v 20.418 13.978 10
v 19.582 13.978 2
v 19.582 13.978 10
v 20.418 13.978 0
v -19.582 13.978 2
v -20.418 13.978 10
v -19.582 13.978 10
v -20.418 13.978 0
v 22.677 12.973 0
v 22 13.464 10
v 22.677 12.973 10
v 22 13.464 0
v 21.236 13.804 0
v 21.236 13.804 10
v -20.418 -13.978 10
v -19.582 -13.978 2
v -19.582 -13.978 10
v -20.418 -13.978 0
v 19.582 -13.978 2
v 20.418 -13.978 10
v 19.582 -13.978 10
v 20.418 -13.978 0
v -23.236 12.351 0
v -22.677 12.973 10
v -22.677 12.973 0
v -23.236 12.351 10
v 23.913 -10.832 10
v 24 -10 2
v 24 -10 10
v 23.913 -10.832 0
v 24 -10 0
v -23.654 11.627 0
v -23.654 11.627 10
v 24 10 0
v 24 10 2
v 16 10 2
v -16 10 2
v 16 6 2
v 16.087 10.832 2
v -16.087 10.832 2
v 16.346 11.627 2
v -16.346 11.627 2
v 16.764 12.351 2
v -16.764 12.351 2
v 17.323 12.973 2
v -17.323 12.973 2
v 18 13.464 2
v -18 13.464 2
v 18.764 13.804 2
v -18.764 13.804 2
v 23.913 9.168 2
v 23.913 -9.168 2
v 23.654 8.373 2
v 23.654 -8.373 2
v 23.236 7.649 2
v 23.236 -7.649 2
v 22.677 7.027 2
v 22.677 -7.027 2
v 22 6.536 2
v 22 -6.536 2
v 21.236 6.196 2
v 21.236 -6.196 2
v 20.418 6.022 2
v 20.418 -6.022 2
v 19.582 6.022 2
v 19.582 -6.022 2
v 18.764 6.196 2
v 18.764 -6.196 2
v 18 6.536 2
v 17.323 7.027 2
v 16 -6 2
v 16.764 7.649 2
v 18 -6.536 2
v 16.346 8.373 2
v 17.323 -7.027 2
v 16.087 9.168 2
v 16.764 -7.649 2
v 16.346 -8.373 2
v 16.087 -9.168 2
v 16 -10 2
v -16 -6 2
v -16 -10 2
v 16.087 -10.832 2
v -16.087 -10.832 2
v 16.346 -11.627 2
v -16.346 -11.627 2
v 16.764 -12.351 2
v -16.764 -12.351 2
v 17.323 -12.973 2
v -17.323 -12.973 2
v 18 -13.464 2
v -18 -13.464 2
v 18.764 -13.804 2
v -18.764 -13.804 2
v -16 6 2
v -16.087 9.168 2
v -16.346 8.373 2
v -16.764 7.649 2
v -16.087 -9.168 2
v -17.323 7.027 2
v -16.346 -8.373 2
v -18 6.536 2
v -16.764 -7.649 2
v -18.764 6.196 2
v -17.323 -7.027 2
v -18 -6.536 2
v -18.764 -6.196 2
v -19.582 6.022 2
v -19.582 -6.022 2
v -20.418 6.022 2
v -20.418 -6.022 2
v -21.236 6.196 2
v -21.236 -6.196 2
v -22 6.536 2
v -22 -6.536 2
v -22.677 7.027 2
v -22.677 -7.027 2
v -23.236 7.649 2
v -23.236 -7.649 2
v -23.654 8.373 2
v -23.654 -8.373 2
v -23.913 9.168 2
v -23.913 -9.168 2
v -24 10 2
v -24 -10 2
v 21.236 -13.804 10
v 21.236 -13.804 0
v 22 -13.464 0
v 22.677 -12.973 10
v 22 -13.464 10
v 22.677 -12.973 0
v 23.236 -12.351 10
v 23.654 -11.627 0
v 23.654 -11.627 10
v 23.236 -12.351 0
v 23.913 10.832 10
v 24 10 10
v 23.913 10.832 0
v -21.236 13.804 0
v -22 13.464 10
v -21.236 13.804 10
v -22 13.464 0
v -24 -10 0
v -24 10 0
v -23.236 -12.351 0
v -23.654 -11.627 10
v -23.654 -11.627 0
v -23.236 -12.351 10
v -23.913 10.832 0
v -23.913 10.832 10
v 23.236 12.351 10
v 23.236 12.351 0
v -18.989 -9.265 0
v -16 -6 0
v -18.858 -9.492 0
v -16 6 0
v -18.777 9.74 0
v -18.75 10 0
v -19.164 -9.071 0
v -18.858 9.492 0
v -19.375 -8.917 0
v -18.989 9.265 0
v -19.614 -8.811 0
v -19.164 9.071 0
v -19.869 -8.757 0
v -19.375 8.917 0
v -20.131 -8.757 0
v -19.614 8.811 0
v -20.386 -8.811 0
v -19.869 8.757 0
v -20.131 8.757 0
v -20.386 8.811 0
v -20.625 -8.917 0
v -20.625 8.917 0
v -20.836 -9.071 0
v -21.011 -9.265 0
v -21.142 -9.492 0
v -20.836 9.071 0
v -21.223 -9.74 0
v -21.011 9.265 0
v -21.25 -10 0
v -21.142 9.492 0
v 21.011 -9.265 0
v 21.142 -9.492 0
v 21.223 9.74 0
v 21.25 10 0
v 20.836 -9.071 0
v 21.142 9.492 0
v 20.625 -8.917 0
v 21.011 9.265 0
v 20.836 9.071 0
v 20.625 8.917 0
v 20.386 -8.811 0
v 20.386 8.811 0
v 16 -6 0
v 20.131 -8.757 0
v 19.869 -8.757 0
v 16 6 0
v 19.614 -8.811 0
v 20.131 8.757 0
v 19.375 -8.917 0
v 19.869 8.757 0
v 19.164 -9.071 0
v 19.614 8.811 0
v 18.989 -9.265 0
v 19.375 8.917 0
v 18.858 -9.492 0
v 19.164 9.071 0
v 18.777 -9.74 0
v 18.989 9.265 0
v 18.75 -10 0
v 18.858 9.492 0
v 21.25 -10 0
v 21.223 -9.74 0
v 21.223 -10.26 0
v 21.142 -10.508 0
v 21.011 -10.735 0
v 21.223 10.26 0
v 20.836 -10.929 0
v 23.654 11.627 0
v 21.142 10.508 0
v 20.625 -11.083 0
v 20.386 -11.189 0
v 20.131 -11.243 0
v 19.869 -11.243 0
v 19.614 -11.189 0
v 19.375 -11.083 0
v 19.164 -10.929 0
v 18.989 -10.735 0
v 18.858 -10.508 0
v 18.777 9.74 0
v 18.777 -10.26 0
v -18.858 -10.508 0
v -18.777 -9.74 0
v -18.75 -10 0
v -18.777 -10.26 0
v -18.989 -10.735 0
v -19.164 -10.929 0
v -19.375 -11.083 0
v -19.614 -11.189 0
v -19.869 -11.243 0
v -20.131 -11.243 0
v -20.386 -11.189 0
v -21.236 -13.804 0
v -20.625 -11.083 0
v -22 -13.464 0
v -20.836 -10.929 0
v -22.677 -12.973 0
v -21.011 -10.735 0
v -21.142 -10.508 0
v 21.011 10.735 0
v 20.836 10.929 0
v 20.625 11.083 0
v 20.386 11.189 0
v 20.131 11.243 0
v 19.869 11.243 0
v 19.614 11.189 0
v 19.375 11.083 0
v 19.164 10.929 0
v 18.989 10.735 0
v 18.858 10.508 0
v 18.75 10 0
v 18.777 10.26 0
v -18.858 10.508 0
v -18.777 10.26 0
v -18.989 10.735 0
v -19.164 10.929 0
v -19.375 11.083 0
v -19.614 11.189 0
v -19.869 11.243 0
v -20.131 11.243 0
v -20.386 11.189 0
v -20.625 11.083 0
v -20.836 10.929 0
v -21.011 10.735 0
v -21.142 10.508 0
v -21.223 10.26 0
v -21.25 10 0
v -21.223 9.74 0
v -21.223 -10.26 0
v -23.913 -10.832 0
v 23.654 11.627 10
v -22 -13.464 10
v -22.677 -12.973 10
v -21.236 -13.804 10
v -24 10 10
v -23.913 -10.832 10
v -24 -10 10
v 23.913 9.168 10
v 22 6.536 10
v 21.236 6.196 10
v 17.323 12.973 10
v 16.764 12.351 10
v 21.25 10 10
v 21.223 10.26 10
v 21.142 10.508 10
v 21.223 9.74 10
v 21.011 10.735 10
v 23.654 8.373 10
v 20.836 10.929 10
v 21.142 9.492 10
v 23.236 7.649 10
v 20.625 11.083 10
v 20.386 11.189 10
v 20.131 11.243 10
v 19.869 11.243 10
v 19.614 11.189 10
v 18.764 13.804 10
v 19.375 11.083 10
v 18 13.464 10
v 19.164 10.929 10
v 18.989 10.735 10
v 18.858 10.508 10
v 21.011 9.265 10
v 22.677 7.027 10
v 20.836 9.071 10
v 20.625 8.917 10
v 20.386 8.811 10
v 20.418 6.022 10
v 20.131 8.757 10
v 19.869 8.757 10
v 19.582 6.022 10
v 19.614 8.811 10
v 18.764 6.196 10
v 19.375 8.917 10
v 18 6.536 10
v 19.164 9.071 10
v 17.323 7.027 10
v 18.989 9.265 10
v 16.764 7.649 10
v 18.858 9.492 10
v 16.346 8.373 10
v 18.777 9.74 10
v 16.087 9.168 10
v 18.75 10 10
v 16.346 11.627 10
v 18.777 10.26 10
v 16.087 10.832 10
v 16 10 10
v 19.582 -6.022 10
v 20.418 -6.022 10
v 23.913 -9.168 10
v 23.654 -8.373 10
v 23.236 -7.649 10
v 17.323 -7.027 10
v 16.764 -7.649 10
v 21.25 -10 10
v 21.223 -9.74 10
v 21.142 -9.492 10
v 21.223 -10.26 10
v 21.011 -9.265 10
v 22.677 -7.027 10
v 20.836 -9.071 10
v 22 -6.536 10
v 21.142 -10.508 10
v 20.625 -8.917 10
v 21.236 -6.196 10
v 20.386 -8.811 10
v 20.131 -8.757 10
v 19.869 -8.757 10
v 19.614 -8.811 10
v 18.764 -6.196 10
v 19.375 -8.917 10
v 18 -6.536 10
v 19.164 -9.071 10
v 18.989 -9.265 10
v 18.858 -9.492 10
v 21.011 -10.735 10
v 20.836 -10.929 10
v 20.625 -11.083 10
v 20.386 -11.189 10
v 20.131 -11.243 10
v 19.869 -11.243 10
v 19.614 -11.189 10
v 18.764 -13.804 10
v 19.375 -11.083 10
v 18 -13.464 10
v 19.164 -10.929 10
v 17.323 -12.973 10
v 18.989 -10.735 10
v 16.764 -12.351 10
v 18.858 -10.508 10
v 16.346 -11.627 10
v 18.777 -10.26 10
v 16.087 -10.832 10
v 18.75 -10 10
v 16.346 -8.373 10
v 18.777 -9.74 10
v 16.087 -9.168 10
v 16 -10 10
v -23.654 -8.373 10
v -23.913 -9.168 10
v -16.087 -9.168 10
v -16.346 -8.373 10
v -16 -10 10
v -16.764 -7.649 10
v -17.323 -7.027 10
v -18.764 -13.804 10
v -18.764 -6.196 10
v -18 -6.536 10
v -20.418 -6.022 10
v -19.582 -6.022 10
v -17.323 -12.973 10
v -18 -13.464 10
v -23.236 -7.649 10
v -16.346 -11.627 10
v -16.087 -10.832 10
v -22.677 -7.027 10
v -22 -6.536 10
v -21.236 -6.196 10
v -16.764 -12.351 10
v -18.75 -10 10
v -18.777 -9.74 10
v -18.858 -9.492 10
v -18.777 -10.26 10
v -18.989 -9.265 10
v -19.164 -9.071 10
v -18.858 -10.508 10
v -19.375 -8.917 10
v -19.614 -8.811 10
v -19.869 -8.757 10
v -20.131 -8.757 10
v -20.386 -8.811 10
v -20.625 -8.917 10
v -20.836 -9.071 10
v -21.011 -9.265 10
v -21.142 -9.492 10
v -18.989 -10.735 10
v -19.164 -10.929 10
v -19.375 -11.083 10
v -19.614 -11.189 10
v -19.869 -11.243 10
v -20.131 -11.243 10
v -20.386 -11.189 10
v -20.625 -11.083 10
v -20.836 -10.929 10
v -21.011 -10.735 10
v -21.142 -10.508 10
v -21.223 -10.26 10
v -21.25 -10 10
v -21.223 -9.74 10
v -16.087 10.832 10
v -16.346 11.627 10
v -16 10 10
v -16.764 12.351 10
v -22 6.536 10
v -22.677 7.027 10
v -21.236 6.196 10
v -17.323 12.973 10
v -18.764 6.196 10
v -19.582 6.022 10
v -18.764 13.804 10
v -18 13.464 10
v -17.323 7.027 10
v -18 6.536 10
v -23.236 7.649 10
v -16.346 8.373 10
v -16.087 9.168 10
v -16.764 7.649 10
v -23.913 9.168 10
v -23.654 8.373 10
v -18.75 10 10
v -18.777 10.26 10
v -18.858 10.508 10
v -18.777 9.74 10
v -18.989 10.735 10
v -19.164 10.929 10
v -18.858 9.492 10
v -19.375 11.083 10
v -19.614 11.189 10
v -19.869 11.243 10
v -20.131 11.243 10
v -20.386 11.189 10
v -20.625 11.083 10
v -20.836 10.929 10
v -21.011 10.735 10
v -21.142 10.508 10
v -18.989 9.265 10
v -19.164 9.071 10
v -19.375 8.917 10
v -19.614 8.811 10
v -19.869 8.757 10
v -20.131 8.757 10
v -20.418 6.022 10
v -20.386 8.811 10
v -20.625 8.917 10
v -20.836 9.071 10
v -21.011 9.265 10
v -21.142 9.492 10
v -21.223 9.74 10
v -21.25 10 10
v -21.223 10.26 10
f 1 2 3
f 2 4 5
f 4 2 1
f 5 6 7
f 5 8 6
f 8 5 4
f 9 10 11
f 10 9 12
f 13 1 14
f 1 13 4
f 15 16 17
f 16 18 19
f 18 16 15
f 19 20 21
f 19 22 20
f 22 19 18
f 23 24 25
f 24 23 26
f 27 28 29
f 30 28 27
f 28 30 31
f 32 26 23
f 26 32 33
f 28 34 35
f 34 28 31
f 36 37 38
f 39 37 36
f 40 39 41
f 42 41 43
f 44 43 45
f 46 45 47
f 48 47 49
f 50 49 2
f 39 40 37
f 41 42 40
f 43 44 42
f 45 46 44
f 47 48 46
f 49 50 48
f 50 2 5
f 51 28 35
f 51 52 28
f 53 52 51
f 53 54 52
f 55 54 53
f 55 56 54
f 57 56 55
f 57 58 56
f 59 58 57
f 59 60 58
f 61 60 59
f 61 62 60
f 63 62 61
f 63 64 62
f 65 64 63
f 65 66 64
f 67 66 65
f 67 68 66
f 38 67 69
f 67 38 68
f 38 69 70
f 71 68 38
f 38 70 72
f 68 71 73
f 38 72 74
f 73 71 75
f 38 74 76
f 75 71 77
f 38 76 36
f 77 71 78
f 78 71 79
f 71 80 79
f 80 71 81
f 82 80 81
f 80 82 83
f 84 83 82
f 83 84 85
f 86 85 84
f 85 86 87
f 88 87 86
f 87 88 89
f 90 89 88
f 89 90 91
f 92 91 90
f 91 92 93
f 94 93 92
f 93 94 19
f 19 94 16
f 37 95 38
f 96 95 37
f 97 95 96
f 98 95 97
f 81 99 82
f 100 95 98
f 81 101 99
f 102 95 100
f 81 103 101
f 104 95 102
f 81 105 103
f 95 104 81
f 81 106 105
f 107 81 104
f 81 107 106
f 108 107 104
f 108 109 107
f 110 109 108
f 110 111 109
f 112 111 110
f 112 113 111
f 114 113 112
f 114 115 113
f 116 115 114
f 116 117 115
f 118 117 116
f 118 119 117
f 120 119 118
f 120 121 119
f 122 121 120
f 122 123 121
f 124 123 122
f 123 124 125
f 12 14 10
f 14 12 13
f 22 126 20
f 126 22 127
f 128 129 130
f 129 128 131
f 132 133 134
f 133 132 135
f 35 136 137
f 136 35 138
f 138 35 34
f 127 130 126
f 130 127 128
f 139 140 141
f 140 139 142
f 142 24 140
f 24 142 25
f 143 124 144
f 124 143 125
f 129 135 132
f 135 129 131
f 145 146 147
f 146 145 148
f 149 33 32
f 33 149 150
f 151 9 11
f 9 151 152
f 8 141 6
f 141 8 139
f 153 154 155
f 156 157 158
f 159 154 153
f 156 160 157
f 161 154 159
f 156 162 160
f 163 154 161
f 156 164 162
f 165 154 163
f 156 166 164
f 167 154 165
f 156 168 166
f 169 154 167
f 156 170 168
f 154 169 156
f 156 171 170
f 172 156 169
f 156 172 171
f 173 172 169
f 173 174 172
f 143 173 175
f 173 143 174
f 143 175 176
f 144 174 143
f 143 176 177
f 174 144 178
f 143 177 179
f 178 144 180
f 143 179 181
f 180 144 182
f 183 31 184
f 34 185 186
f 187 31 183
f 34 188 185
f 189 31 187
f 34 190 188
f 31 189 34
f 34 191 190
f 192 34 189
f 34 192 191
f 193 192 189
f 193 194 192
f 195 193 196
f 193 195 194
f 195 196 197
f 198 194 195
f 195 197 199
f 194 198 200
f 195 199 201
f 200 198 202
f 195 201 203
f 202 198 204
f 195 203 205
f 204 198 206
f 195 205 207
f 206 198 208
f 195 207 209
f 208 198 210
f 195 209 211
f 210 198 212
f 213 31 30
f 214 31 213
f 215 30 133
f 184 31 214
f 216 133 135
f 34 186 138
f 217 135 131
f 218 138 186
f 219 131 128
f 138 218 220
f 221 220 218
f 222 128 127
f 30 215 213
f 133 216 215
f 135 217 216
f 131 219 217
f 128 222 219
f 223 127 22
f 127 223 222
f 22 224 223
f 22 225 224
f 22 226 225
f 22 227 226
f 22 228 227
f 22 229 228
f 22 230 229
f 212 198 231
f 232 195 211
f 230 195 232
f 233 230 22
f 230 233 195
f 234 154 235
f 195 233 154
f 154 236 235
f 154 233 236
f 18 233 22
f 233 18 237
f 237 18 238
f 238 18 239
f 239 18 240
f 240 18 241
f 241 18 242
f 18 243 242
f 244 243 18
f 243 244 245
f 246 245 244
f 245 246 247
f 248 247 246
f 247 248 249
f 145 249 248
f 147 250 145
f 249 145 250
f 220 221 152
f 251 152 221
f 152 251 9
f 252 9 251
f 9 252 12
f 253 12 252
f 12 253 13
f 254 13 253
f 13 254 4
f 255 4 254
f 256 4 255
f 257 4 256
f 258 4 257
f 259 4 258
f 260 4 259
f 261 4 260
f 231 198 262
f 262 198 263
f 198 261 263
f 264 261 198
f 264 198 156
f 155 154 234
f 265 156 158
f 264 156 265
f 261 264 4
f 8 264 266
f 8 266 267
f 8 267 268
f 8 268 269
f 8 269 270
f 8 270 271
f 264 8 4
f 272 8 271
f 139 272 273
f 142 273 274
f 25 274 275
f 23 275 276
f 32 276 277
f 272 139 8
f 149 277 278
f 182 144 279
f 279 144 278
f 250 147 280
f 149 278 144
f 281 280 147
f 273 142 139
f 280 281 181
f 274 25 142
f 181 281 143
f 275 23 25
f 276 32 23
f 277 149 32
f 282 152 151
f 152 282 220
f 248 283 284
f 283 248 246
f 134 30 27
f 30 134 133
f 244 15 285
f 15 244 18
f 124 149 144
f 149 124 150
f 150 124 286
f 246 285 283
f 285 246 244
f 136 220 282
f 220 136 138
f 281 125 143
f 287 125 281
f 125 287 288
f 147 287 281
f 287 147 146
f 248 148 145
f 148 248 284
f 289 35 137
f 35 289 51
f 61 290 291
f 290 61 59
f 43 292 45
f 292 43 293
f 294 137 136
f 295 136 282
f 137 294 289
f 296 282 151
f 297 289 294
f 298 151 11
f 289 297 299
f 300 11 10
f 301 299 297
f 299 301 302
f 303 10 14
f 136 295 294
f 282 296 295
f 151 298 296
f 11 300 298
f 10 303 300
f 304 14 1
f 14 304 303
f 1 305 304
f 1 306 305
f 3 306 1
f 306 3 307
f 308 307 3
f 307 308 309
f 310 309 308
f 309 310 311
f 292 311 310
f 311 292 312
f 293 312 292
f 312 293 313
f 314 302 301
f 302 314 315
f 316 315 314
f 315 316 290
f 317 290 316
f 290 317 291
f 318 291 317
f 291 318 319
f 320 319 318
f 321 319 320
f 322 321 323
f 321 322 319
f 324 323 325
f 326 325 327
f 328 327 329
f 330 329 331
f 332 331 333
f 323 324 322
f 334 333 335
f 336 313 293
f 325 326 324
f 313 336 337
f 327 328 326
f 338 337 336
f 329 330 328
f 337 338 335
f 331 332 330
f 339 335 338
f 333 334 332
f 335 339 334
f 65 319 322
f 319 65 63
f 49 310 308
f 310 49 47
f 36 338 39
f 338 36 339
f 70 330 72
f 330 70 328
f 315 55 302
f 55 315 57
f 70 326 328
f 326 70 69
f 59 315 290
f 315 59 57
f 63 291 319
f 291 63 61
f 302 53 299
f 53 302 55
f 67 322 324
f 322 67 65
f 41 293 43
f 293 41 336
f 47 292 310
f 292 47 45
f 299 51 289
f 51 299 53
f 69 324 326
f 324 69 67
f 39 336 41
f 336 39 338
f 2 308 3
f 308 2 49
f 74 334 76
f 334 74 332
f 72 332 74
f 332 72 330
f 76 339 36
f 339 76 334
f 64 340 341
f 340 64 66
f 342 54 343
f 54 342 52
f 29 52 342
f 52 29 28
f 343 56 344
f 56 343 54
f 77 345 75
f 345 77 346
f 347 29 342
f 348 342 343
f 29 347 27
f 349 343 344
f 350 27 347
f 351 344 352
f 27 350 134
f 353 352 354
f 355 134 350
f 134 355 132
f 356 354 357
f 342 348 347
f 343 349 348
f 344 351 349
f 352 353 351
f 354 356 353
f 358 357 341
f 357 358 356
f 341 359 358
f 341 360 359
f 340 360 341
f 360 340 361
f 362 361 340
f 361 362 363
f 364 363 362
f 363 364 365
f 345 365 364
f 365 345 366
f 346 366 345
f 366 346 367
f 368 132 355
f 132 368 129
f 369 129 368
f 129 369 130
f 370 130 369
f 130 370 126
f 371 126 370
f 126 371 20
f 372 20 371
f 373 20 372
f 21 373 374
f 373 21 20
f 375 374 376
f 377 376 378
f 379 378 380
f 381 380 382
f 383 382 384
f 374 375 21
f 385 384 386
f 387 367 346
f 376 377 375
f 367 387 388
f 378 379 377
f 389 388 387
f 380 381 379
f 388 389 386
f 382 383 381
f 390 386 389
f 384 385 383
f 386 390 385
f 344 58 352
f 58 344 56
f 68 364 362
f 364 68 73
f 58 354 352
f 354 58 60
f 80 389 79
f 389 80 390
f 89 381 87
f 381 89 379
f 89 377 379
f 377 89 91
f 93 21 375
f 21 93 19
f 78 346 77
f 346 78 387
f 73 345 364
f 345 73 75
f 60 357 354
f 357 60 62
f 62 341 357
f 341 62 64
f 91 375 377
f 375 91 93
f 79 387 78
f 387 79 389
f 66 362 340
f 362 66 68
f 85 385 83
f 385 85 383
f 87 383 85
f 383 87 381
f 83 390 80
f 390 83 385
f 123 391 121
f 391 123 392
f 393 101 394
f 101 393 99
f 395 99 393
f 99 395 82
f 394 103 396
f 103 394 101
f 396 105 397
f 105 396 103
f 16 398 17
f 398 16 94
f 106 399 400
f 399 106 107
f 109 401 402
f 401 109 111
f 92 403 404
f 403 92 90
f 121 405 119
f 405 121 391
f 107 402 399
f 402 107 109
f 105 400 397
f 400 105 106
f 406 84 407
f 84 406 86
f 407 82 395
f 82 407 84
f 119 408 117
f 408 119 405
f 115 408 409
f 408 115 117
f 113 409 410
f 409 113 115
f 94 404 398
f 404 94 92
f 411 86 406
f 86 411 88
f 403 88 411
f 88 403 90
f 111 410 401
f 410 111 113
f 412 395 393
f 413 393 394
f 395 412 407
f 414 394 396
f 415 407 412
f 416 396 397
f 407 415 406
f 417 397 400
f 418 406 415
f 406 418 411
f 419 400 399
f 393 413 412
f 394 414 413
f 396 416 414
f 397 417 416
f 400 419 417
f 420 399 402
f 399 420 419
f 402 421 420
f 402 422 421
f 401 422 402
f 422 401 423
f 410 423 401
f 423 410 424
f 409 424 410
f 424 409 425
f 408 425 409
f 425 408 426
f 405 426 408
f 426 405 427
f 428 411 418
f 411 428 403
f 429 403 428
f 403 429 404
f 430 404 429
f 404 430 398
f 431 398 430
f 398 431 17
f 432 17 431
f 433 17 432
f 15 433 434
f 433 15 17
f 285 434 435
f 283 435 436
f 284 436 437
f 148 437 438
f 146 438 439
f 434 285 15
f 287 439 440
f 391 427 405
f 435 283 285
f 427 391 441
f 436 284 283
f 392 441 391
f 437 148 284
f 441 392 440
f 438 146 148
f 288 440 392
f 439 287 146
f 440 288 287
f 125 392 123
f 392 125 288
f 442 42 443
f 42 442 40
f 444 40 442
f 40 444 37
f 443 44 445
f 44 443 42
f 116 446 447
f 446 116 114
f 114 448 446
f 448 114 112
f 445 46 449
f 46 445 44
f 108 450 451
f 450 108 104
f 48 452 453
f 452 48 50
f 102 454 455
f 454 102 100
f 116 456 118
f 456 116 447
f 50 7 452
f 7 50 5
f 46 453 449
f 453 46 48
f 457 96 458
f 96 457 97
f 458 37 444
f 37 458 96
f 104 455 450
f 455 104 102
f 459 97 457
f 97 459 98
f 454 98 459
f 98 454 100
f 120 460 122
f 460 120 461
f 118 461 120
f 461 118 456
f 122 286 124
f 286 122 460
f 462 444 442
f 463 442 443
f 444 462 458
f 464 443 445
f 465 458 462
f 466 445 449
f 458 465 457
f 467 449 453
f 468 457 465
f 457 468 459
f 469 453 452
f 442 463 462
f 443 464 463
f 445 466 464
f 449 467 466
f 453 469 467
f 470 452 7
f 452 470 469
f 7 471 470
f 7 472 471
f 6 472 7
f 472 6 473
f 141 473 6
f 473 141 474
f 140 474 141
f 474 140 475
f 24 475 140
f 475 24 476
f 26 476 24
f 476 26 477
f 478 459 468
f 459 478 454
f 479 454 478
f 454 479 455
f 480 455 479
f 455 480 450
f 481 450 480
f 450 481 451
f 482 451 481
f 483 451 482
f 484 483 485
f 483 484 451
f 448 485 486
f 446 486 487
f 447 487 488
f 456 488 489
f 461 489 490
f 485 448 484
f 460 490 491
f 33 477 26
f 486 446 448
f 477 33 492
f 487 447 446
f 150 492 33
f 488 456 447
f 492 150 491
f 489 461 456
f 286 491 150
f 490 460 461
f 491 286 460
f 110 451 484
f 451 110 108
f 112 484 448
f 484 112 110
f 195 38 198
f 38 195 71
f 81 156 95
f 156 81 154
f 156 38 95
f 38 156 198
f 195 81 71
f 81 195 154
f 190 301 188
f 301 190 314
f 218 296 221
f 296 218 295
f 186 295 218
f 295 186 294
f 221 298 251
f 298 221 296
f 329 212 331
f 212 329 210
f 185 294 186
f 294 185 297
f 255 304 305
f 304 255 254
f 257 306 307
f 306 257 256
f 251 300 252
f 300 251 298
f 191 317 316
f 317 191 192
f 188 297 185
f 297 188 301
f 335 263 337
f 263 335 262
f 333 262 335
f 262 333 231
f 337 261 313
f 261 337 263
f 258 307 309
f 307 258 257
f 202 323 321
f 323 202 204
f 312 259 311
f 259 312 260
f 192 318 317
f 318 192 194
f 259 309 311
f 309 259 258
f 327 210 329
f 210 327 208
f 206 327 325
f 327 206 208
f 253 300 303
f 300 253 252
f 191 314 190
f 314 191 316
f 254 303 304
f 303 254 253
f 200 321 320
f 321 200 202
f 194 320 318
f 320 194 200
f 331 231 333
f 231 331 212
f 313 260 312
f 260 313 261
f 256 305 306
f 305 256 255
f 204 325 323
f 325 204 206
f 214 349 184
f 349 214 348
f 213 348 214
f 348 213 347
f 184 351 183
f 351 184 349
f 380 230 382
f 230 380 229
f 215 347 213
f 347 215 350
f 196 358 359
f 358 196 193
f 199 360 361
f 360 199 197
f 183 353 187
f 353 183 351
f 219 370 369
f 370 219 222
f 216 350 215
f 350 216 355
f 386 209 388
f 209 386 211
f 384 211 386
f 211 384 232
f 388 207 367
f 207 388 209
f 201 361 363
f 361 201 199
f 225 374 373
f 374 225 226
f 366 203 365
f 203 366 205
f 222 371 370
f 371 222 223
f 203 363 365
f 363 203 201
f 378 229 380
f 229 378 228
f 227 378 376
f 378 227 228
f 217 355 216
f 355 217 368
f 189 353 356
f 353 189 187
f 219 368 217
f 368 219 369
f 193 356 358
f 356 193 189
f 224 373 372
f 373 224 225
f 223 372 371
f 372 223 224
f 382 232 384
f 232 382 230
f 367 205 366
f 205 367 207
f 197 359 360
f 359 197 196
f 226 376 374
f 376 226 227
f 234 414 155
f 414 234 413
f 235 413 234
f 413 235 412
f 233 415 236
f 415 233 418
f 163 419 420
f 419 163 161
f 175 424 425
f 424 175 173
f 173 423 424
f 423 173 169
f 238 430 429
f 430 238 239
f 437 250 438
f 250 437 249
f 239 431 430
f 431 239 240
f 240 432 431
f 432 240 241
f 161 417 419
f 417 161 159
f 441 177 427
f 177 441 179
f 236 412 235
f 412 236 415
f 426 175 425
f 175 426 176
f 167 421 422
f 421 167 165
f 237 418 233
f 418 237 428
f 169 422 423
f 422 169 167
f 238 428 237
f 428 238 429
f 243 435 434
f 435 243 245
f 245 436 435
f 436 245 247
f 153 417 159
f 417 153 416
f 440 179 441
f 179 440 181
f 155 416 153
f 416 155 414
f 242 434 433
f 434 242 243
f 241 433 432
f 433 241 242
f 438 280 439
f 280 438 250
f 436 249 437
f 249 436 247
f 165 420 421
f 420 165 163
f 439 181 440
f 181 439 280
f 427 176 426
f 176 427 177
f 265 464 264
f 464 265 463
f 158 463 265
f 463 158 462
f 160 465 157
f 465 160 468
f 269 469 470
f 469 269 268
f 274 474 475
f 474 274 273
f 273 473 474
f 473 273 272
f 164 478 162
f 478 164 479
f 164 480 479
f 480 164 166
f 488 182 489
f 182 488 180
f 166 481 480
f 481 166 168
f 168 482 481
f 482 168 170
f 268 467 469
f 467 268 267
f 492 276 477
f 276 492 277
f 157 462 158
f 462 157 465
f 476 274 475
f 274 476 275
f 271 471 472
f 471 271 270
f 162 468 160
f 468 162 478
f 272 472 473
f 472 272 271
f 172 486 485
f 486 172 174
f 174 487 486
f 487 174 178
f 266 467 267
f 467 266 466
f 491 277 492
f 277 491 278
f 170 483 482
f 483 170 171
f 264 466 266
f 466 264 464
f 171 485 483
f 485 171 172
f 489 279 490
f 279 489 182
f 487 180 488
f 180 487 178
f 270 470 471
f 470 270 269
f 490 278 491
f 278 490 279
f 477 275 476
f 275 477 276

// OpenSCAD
$fn=30;

soporte(40,20,8,2.5,10);

module soporte(lenght, width, ext_dia, int_dia, height)
{
difference(){
union(){
minkowski(){
translate([0,0,1])cube([lenght,width,2],center=true);
cylinder(d=ext_dia,h=0.00000001);
}
translate([lenght/2,width/2,0])cylinder(d=ext_dia,h=height);
translate([lenght/2,-width/2,0])cylinder(d=ext_dia,h=height);
translate([-lenght/2,-width/2,0])cylinder(d=ext_dia,h=height);
translate([-lenght/2,width/2,0])cylinder(d=ext_dia,h=height);
}
cube([lenght-ext_dia,width-ext_dia,5],center=true);
translate([lenght/2,width/2,-1])cylinder(d=int_dia,h=height+2);
translate([lenght/2,-width/2,-1])cylinder(d=int_dia,h=height+2);
translate([-lenght/2,-width/2,-1])cylinder(d=int_dia,h=height+2);
translate([-lenght/2,width/2,-1])cylinder(d=int_dia,h=height+2);
}
}
